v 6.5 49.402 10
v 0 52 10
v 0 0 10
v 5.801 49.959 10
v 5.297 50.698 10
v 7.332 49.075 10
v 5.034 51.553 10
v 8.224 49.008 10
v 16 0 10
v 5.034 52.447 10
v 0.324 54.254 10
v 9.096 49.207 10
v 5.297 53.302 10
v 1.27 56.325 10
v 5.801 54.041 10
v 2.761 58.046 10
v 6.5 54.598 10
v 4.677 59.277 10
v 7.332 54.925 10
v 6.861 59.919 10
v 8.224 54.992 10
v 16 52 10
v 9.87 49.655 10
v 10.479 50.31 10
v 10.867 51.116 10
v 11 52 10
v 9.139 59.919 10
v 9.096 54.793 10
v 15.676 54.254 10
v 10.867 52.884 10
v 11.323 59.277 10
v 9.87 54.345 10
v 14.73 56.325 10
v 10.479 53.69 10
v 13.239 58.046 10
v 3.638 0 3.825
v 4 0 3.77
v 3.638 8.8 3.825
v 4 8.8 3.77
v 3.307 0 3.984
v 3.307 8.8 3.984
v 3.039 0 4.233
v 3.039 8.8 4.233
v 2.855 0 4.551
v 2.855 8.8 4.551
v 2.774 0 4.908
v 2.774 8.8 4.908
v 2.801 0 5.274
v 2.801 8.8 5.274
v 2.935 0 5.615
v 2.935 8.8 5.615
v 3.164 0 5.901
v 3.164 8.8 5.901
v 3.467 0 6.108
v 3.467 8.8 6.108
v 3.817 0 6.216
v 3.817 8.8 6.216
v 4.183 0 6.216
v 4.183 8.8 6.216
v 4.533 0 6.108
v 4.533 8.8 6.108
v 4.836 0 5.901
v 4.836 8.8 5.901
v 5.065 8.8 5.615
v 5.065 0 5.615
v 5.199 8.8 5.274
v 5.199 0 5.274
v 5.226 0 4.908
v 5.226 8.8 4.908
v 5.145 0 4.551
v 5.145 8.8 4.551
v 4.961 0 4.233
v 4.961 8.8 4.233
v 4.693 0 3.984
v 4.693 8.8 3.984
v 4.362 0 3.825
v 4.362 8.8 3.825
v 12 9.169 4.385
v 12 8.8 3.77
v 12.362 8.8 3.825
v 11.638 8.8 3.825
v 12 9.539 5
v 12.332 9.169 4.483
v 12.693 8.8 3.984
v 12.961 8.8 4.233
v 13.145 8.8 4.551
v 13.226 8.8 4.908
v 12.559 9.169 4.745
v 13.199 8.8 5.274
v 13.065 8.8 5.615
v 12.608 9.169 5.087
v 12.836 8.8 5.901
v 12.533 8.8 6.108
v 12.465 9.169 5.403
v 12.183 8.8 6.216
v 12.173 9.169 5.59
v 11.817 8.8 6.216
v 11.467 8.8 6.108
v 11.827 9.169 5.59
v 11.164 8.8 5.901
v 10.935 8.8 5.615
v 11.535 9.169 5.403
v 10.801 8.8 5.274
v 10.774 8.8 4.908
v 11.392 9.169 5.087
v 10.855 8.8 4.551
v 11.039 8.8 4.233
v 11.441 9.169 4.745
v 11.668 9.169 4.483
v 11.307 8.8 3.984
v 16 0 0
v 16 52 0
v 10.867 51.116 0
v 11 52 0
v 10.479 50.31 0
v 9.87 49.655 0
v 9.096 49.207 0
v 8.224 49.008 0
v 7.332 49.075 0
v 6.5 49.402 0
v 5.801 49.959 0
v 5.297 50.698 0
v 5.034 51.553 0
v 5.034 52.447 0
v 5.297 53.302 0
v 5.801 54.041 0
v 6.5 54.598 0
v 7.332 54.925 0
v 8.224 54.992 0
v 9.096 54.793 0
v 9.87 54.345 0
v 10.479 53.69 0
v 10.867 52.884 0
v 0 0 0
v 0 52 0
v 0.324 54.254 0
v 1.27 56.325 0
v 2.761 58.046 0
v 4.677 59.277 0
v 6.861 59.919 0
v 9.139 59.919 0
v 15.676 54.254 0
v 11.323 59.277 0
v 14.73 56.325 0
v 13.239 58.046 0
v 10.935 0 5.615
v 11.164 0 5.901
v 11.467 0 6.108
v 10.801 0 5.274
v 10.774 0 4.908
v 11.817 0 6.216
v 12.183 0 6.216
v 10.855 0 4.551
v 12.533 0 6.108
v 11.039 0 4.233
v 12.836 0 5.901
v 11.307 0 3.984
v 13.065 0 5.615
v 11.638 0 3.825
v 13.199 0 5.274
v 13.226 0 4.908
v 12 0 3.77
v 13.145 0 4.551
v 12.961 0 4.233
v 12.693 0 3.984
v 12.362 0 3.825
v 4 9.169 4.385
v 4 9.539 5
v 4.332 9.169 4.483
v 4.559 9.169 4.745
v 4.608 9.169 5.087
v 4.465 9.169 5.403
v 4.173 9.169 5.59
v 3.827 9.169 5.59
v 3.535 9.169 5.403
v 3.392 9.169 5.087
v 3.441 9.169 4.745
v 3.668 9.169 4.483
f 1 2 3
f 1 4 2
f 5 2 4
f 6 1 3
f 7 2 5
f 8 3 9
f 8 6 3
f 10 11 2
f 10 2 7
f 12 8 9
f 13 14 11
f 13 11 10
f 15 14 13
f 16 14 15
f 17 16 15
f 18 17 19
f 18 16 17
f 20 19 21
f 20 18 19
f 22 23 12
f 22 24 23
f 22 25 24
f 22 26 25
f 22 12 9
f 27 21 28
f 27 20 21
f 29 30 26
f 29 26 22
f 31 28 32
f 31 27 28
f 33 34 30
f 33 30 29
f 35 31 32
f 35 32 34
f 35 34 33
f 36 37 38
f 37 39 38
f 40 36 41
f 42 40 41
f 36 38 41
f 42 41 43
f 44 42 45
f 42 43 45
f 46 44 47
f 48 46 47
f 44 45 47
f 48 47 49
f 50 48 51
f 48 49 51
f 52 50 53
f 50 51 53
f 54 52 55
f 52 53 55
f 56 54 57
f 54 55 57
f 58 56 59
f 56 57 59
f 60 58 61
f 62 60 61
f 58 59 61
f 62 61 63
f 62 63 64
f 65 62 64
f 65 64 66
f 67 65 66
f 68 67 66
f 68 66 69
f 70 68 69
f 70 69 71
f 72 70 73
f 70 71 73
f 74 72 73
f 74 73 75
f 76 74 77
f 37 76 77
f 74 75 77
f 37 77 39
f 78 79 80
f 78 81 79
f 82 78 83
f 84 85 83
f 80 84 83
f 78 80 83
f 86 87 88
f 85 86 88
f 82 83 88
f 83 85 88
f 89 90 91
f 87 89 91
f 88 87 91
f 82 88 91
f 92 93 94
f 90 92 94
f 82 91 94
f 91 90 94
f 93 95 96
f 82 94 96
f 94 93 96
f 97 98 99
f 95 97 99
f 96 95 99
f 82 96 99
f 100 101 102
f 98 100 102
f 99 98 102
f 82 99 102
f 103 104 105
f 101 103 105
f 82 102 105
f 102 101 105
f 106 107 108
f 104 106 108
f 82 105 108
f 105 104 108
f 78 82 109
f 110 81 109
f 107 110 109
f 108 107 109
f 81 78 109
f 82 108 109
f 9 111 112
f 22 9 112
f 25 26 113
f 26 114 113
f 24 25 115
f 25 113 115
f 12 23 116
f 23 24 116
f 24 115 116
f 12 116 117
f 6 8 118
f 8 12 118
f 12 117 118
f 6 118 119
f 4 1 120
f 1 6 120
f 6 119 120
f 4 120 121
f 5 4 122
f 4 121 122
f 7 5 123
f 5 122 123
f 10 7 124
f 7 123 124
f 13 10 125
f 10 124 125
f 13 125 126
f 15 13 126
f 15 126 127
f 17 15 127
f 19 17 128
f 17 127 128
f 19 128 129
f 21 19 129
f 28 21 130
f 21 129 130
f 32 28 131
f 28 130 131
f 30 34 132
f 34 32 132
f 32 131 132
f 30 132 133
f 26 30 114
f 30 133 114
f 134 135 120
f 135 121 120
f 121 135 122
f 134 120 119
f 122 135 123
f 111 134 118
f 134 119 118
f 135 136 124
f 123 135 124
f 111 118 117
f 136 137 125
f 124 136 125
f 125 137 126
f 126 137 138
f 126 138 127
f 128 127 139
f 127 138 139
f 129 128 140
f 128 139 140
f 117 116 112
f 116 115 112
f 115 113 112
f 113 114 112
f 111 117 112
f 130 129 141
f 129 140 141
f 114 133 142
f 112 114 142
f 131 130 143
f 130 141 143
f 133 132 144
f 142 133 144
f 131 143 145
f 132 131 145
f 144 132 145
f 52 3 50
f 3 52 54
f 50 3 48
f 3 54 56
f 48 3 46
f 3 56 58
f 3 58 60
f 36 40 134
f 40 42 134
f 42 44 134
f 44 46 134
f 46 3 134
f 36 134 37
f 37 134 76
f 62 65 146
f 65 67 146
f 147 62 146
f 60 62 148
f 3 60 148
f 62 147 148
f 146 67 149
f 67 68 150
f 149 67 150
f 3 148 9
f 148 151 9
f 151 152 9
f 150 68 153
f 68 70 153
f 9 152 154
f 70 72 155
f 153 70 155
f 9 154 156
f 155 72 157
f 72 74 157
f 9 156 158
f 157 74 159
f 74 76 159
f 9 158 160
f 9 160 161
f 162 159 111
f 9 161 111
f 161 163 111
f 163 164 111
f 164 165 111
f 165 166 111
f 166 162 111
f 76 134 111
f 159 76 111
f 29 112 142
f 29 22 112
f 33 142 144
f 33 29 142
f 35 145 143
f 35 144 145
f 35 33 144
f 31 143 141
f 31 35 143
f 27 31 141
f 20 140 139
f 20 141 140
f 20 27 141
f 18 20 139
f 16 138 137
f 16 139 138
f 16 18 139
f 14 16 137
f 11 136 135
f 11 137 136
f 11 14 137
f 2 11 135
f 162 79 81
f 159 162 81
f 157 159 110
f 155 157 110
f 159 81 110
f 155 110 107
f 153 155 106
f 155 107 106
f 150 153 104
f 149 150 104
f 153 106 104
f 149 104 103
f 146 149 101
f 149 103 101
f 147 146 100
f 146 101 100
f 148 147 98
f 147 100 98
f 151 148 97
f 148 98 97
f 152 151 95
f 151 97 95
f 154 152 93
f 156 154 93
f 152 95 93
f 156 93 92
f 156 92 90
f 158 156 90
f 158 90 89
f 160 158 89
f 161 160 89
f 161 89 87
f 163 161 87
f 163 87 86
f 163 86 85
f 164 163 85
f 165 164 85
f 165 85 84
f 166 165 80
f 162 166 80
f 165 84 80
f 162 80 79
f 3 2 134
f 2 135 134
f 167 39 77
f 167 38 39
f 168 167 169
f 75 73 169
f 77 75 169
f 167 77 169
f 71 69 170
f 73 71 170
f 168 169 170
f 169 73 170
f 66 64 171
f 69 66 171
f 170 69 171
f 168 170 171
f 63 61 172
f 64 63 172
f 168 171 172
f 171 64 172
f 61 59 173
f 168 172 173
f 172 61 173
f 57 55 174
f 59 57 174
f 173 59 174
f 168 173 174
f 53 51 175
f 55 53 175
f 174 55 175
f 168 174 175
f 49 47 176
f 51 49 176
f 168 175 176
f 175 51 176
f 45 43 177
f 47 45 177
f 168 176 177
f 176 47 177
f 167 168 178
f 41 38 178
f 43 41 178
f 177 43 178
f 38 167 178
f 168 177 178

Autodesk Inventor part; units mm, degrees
ref_plane "YZ Plane" through (0, 0, 0) normal (1, 0, 0) x (0, 1, 0)
ref_plane "XZ Plane" through (0, 0, 0) normal (0, 1, 0) x (-1, 0, 0)
ref_plane "XY Plane" through (0, 0, 0) normal (0, 0, 1) x (1, 0, 0)
sketch "Sketch1" plane through (0, 0, 0) normal (0, 0, 1) x (1, 0, 0)
  line L0 (0, 0) -> (16, 0)
  line L1 (16, 0) -> (16, 60)
  line L2 (16, 60) -> (0, 60)
  line L3 (0, 60) -> (0, 0)
  circle A0 centre (8, 52) radius 3
  dimension "d9" = 16
  dimension "d10" = 60
  dimension "d11" = 6
  dimension "d12" = 8
extrude "Extrusion1" add sketch "Sketch1" along normal blind 10
sketch "Sketch2" plane through (0, 0, 10) normal (0, 0, 1) x (1, 0, 0)
  line L0 (16, 60) -> (0, 60) projected
  circle A0 centre (8, 52) radius 3 projected
  arc A1 (16, 52) -> (0, 52) centre (8, 52) ccw
  line L1 (16.7201, 52) -> (16.7201, 60.3787)
  line L2 (16.7201, 60.3787) -> (-0.5009, 60.3787)
  line L3 (-0.5009, 60.3787) -> (-0.5009, 52)
  line L4 (-0.5009, 52) -> (0, 52)
  line L5 (16, 52) -> (16.7201, 52)
  point P0 (0, 0)
extrude "Extrusion2" cut sketch "Sketch2" against normal up to next contours A1 L4 L3 L2 L1 L5
sketch "Sketch3" plane through (0, 0, 0) normal (0, -1, 0) x (1, 0, 0)
  line L0 (0, 10) -> (16, 10) projected
  line L1 (0, 0) -> (16, 0) projected
  line L2 (0, 0) -> (0, 10) projected
  line L3 (16, 0) -> (16, 10) projected
  point P0 (4, 5)
  point P1 (12, 5)
  dimension "d19" = 5
  dimension "d20" = 5
  dimension "d21" = 4
  dimension "d22" = 4
hole "Hole1" at (4, 0, 5) at (12, 0, 5) direction (0, 1, 0) diameter 2.459 depth 8.8 tip angle 118 thread size "M3x0.5" class "6H" standard "ANSI Metric M Profile"
properties part number "SupportCylinder"
